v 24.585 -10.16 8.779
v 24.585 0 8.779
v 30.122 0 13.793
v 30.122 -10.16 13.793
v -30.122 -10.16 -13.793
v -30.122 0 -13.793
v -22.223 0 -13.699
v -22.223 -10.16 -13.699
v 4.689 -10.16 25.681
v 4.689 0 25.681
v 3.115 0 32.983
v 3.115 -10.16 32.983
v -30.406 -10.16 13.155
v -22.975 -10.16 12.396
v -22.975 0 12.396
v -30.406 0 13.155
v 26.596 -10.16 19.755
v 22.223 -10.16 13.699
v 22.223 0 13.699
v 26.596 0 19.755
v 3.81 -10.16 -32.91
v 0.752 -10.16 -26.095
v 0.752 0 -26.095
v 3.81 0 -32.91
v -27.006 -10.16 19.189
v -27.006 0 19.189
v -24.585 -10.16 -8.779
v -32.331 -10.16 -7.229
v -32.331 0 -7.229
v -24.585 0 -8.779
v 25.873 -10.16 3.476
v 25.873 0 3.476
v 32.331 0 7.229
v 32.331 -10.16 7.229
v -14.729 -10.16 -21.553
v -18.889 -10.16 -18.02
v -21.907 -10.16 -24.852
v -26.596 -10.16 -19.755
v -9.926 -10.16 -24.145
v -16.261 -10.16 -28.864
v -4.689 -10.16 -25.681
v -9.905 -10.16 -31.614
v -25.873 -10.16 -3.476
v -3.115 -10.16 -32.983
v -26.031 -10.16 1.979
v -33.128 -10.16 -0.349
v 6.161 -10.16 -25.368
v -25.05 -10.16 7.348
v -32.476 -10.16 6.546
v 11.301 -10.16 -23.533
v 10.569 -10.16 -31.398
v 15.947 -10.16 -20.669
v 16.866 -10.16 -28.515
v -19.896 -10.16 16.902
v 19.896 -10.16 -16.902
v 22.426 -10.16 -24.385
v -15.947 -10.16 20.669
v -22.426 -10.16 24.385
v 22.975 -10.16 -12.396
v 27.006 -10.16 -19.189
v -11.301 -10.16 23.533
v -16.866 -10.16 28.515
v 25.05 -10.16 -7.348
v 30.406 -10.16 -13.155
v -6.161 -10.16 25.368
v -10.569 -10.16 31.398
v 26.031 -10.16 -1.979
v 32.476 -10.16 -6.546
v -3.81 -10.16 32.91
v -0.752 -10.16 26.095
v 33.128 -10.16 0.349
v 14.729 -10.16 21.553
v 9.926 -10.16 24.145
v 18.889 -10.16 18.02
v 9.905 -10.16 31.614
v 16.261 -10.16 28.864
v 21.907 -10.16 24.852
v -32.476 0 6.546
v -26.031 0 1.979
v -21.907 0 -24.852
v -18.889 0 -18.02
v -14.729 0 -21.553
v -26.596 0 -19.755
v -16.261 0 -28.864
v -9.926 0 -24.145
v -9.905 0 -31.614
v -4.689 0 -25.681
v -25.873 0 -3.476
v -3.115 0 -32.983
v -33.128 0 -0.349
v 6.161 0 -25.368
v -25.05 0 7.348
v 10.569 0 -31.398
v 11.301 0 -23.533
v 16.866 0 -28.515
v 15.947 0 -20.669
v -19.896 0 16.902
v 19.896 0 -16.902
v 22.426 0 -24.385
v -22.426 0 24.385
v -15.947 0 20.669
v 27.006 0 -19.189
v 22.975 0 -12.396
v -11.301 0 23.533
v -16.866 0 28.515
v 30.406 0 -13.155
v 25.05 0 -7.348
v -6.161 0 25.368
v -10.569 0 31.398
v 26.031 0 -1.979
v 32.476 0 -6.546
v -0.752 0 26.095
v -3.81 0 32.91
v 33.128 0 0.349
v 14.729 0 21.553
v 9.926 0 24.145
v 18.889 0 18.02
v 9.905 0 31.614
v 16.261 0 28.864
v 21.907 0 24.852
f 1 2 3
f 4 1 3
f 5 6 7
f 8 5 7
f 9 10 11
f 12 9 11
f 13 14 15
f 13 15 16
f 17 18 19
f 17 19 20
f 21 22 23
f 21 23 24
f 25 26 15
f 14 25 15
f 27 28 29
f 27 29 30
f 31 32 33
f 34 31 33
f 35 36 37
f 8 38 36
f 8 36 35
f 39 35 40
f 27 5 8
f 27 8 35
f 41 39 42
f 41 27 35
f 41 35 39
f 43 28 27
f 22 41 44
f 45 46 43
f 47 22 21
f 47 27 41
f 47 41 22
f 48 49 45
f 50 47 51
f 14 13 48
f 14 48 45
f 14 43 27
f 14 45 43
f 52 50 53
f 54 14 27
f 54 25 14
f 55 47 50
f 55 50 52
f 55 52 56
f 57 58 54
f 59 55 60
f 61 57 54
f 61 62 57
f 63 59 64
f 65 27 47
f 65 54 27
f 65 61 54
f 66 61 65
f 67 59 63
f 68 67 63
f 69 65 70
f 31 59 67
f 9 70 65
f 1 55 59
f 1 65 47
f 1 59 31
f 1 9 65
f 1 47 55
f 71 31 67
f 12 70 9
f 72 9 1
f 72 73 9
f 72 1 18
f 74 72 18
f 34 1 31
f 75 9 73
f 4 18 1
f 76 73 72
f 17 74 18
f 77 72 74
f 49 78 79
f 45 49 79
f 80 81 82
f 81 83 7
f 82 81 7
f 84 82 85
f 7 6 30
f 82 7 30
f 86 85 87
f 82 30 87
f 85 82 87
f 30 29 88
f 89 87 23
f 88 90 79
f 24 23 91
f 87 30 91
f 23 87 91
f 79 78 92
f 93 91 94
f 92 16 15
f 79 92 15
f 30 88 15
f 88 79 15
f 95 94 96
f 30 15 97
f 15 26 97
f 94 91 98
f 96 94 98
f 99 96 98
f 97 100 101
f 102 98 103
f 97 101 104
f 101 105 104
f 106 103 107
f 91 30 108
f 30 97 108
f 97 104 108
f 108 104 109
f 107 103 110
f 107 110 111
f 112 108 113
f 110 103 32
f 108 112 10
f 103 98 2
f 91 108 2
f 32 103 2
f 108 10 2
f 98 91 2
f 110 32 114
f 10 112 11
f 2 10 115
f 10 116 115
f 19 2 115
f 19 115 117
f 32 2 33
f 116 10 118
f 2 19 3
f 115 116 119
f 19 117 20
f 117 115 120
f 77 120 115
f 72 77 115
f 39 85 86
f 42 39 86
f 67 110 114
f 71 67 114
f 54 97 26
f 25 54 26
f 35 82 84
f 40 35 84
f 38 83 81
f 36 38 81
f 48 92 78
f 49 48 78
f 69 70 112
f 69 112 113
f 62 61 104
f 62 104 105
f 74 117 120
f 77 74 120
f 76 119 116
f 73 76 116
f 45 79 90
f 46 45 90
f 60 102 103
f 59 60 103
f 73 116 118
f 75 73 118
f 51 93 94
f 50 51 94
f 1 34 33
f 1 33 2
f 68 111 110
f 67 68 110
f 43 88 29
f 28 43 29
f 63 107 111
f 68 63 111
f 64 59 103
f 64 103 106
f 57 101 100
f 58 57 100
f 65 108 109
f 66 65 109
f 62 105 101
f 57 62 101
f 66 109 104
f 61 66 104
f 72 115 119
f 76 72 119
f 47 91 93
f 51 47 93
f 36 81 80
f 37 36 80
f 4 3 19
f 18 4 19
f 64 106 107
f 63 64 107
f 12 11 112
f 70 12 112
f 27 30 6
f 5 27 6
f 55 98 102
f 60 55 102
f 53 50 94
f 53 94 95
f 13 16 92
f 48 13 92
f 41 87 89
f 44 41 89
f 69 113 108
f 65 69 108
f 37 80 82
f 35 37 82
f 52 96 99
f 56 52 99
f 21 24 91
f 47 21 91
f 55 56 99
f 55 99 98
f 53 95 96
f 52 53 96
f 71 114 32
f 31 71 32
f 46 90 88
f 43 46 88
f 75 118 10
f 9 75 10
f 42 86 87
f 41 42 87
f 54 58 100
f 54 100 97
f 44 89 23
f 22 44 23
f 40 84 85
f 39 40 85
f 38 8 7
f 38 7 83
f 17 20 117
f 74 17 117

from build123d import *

# Parameters (mm, degrees)
F1_DEPTH = 10.16
F2_R     = 25.4
F3_DEPTH = 10.16


with BuildPart() as f1:
    # F0 (on Front) → F1 (new body)
    with BuildSketch(Plane.XZ):
        with BuildLine():
            ThreePointArc((25.2112005568, 3.0911755833), (25.3527562026, 1.5484679297), (25.4, 0))
            ThreePointArc((25.4, 0), (25.3888981273, -0.750900713), (25.3556022141, -1.5011450163))
            Line((25.3556022141, -1.5011450163), (26.0305752657, -1.9793416351))
            Line((26.0305752657, -1.9793416351), (33.1276639033, 0.3492854048))
            Line((33.1276639033, 0.3492854048), (25.8732730079, 3.475972645))
            Line((25.8732730079, 3.475972645), (25.2112005568, 3.0911755833))
        make_face()
        with BuildLine():
            ThreePointArc((25.1136270694, 3.803384732), (25.164933526, 3.4476253613), (25.2112005568, 3.0911755833))
            Line((25.2112005568, 3.0911755833), (25.8732730079, 3.475972645))
            Line((25.8732730079, 3.475972645), (25.1136270694, 3.803384732))
        make_face()
        with BuildLine():
            Line((26.0305752657, -1.9793416351), (25.3556022141, -1.5011450163))
            ThreePointArc((25.3556022141, -1.5011450163), (25.3318209693, -1.8597974033), (25.3029668784, -2.218077355))
            Line((25.3029668784, -2.218077355), (26.0305752657, -1.9793416351))
        make_face()
        with BuildLine():
            ThreePointArc((24.0175837941, 8.2653293156), (24.6667024062, 6.0591907386), (25.1136270694, 3.803384732))
            Line((25.1136270694, 3.803384732), (25.8732730079, 3.475972645))
            Line((25.8732730079, 3.475972645), (32.3311244458, 7.2292812957))
            Line((32.3311244458, 7.2292812957), (24.5851845659, 8.779370241))
            Line((24.5851845659, 8.779370241), (24.0175837941, 8.2653293156))
        make_face()
        with BuildLine():
            Line((26.0305752657, -1.9793416351), (25.3029668784, -2.218077355))
            ThreePointArc((25.3029668784, -2.218077355), (24.9986488389, -4.4975055562), (24.4894158724, -6.740067524))
            Line((24.4894158724, -6.740067524), (25.0502164758, -7.3481491879))
            Line((25.0502164758, -7.3481491879), (32.476365484, -6.5459759343))
            Line((32.476365484, -6.5459759343), (26.0305752657, -1.9793416351))
        make_face()
        with BuildLine():
            ThreePointArc((23.7740659132, 8.9416883169), (23.8982177329, 8.6043703541), (24.0175837941, 8.2653293156))
            Line((24.0175837941, 8.2653293156), (24.5851845659, 8.779370241))
            Line((24.5851845659, 8.779370241), (23.7740659132, 8.9416883169))
        make_face()
        with BuildLine():
            Line((25.0502164758, -7.3481491879), (24.4894158724, -6.740067524))
            ThreePointArc((24.4894158724, -6.740067524), (24.3915862806, -7.0859380971), (24.2888721303, -7.4303896694))
            Line((24.2888721303, -7.4303896694), (25.0502164758, -7.3481491879))
        make_face()
        with BuildLine():
            ThreePointArc((21.7742833704, 13.0782484953), (22.8678991852, 11.0552786875), (23.7740659132, 8.9416883169))
            Line((23.7740659132, 8.9416883169), (24.5851845659, 8.779370241))
            Line((24.5851845659, 8.779370241), (30.1215597081, 13.793322904))
            Line((30.1215597081, 13.793322904), (22.2226055856, 13.6990672294))
            Line((22.2226055856, 13.6990672294), (21.7742833704, 13.0782484953))
        make_face()
        with BuildLine():
            Line((25.0502164758, -7.3481491879), (24.2888721303, -7.4303896694))
            ThreePointArc((24.2888721303, -7.4303896694), (23.5172843987, -9.5967356174), (22.5529245438, -11.6844167386))
            Line((22.5529245438, -11.6844167386), (22.9750430216, -12.3958073608))
            Line((22.9750430216, -12.3958073608), (30.4056940542, -13.155146714))
            Line((30.4056940542, -13.155146714), (25.0502164758, -7.3481491879))
        make_face()
        with BuildLine():
            ThreePointArc((21.3954639959, 13.6891972153), (21.5870351485, 13.3850630741), (21.7742833704, 13.0782484953))
            Line((21.7742833704, 13.0782484953), (22.2226055856, 13.6990672294))
            Line((22.2226055856, 13.6990672294), (21.3954639959, 13.6891972153))
        make_face()
        with BuildLine():
            Line((22.9750430216, -12.3958073608), (22.5529245438, -11.6844167386))
            ThreePointArc((22.5529245438, -11.6844167386), (22.3853222277, -12.002389294), (22.2132371191, -12.3179583003))
            Line((22.2132371191, -12.3179583003), (22.9750430216, -12.3958073608))
        make_face()
        with BuildLine():
            ThreePointArc((18.5793422789, 17.3195854594), (20.0696590374, 15.5681979086), (21.3954639959, 13.6891972153))
            Line((21.3954639959, 13.6891972153), (22.2226055856, 13.6990672294))
            Line((22.2226055856, 13.6990672294), (26.5955382719, 19.7545301137))
            Line((26.5955382719, 19.7545301137), (18.8887921054, 18.0200492444))
            Line((18.8887921054, 18.0200492444), (18.5793422789, 17.3195854594))
        make_face()
        with BuildLine():
            Line((22.9750430216, -12.3958073608), (22.2132371191, -12.3179583003))
            ThreePointArc((22.2132371191, -12.3179583003), (21.0081017818, -14.2765422818), (19.6307621917, -16.1181008736))
            Line((19.6307621917, -16.1181008736), (19.8957499409, -16.9017092703))
            Line((19.8957499409, -16.9017092703), (27.0061478915, -19.1893744569))
            Line((27.0061478915, -19.1893744569), (22.9750430216, -12.3958073608))
        make_face()
        with BuildLine():
            ThreePointArc((18.0817776352, 17.8384225073), (18.332395542, 17.580764309), (18.5793422789, 17.3195854594))
            Line((18.5793422789, 17.3195854594), (18.8887921054, 18.0200492444))
            Line((18.8887921054, 18.0200492444), (18.0817776352, 17.8384225073))
        make_face()
        with BuildLine():
            Line((19.8957499409, -16.9017092703), (19.6307621917, -16.1181008736))
            ThreePointArc((19.6307621917, -16.1181008736), (19.4007121767, -16.3942784848), (19.166777055, -16.6671730454))
            Line((19.166777055, -16.6671730454), (19.8957499409, -16.9017092703))
        make_face()
        with BuildLine():
            ThreePointArc((14.5723947762, 20.8039734303), (16.3942784848, 19.4007121767), (18.0817776352, 17.8384225073))
            Line((18.0817776352, 17.8384225073), (18.8887921054, 18.0200492444))
            Line((18.8887921054, 18.0200492444), (21.9071641936, 24.8523695646))
            Line((21.9071641936, 24.8523695646), (14.7294477716, 21.5534686376))
            Line((14.7294477716, 21.5534686376), (14.5723947762, 20.8039734303))
        make_face()
        with BuildLine():
            Line((19.8957499409, -16.9017092703), (19.166777055, -16.6671730454))
            ThreePointArc((19.166777055, -16.6671730454), (17.580764309, -18.332395542), (15.850641333, -19.8473466572))
            Line((15.850641333, -19.8473466572), (15.9469171174, -20.6689253814))
            Line((15.9469171174, -20.6689253814), (22.4263034761, -24.3849344552))
            Line((22.4263034761, -24.3849344552), (19.8957499409, -16.9017092703))
        make_face()
        with BuildLine():
            ThreePointArc((13.9778308259, 21.2080231375), (14.2765422818, 21.0081017818), (14.5723947762, 20.8039734303))
            Line((14.5723947762, 20.8039734303), (14.7294477716, 21.5534686376))
            Line((14.7294477716, 21.5534686376), (13.9778308259, 21.2080231375))
        make_face()
        with BuildLine():
            Line((15.9469171174, -20.6689253814), (15.850641333, -19.8473466572))
            ThreePointArc((15.850641333, -19.8473466572), (15.5681979086, -20.0696590374), (15.2826368611, -20.2879523504))
            Line((15.2826368611, -20.2879523504), (15.9469171174, -20.6689253814))
        make_face()
        with BuildLine():
            ThreePointArc((9.9285636957, 23.3791279337), (12.002389294, 22.3853222277), (13.9778308259, 21.2080231375))
            Line((13.9778308259, 21.2080231375), (14.7294477716, 21.5534686376))
            Line((14.7294477716, 21.5534686376), (16.2613419179, 28.8640412107))
            Line((16.2613419179, 28.8640412107), (9.9263558905, 24.1448980264))
            Line((9.9263558905, 24.1448980264), (9.9285636957, 23.3791279337))
        make_face()
        with BuildLine():
            Line((15.9469171174, -20.6689253814), (15.2826368611, -20.2879523504))
            ThreePointArc((15.2826368611, -20.2879523504), (13.3850630741, -21.5870351485), (11.3777713882, -22.7091681538))
            Line((11.3777713882, -22.7091681538), (11.3011274941, -23.5328102727))
            Line((11.3011274941, -23.5328102727), (16.8663219854, -28.5147558059))
            Line((16.8663219854, -28.5147558059), (15.9469171174, -20.6689253814))
        make_face()
        with BuildLine():
            ThreePointArc((9.2629857364, 23.6507313893), (9.5967356174, 23.5172843987), (9.9285636957, 23.3791279337))
            Line((9.9285636957, 23.3791279337), (9.9263558905, 24.1448980264))
            Line((9.9263558905, 24.1448980264), (9.2629857364, 23.6507313893))
        make_face()
        with BuildLine():
            Line((11.3011274941, -23.5328102727), (11.3777713882, -22.7091681538))
            ThreePointArc((11.3777713882, -22.7091681538), (11.0552786875, -22.8678991852), (10.7305721022, -23.0220507853))
            Line((10.7305721022, -23.0220507853), (11.3011274941, -23.5328102727))
        make_face()
        with BuildLine():
            ThreePointArc((4.8508067391, 24.932502361), (7.0859380971, 24.3915862806), (9.2629857364, 23.6507313893))
            Line((9.2629857364, 23.6507313893), (9.9263558905, 24.1448980264))
            Line((9.9263558905, 24.1448980264), (9.9048209697, 31.6142157509))
            Line((9.9048209697, 31.6142157509), (4.689434625, 25.6810795113))
            Line((4.689434625, 25.6810795113), (4.8508067391, 24.932502361))
        make_face()
        with BuildLine():
            Line((11.3011274941, -23.5328102727), (10.7305721022, -23.0220507853))
            ThreePointArc((10.7305721022, -23.0220507853), (8.6043703541, -23.8982177329), (6.4076382372, -24.5784900314))
            Line((6.4076382372, -24.5784900314), (6.1614243704, -25.3681984322))
            Line((6.1614243704, -25.3681984322), (10.5692012904, -31.3983454989))
            Line((10.5692012904, -31.3983454989), (11.3011274941, -23.5328102727))
        make_face()
        with BuildLine():
            ThreePointArc((4.1433037215, 25.0597891905), (4.4975055562, 24.9986488389), (4.8508067391, 24.932502361))
            Line((4.8508067391, 24.932502361), (4.689434625, 25.6810795113))
            Line((4.689434625, 25.6810795113), (4.1433037215, 25.0597891905))
        make_face()
        with BuildLine():
            Line((6.1614243704, -25.3681984322), (6.4076382372, -24.5784900314))
            ThreePointArc((6.4076382372, -24.5784900314), (6.0591907386, -24.6667024062), (5.7095298514, -24.7499751288))
            Line((5.7095298514, -24.7499751288), (6.1614243704, -25.3681984322))
        make_face()
        with BuildLine():
            ThreePointArc((-0.4389537487, 25.3962067956), (1.8597974033, 25.3318209693), (4.1433037215, 25.0597891905))
            Line((4.1433037215, 25.0597891905), (4.689434625, 25.6810795113))
            Line((4.689434625, 25.6810795113), (3.1154118166, 32.9826973608))
            Line((3.1154118166, 32.9826973608), (-0.752437436, 26.0948745901))
            Line((-0.752437436, 26.0948745901), (-0.4389537487, 25.3962067956))
        make_face()
        with BuildLine():
            Line((6.1614243704, -25.3681984322), (5.7095298514, -24.7499751288))
            ThreePointArc((5.7095298514, -24.7499751288), (3.4476253613, -25.164933526), (1.1574605479, -25.3736139539))
            Line((1.1574605479, -25.3736139539), (0.752437436, -26.0948745901))
            Line((0.752437436, -26.0948745901), (3.8101557823, -32.9096768276))
            Line((3.8101557823, -32.9096768276), (6.1614243704, -25.3681984322))
        make_face()
        with BuildLine():
            ThreePointArc((-1.1574605479, 25.3736139539), (-0.7982870791, 25.387452368), (-0.4389537487, 25.3962067956))
            Line((-0.4389537487, 25.3962067956), (-0.752437436, 26.0948745901))
            Line((-0.752437436, 26.0948745901), (-1.1574605479, 25.3736139539))
        make_face()
        with BuildLine():
            Line((0.752437436, -26.0948745901), (1.1574605479, -25.3736139539))
            ThreePointArc((1.1574605479, -25.3736139539), (0.7982870791, -25.387452368), (0.4389537487, -25.3962067956))
            Line((0.4389537487, -25.3962067956), (0.752437436, -26.0948745901))
        make_face()
        with BuildLine():
            ThreePointArc((-5.7095298514, 24.7499751288), (-3.4476253613, 25.164933526), (-1.1574605479, 25.3736139539))
            Line((-1.1574605479, 25.3736139539), (-0.752437436, 26.0948745901))
            Line((-0.752437436, 26.0948745901), (-3.8101557823, 32.9096768276))
            Line((-3.8101557823, 32.9096768276), (-6.1614243704, 25.3681984322))
            Line((-6.1614243704, 25.3681984322), (-5.7095298514, 24.7499751288))
        make_face()
        with BuildLine():
            Line((0.752437436, -26.0948745901), (0.4389537487, -25.3962067956))
            ThreePointArc((0.4389537487, -25.3962067956), (-1.8597974033, -25.3318209693), (-4.1433037215, -25.0597891905))
            Line((-4.1433037215, -25.0597891905), (-4.689434625, -25.6810795113))
            Line((-4.689434625, -25.6810795113), (-3.1154118166, -32.9826973608))
            Line((-3.1154118166, -32.9826973608), (0.752437436, -26.0948745901))
        make_face()
        with BuildLine():
            ThreePointArc((-6.4076382372, 24.5784900314), (-6.0591907386, 24.6667024062), (-5.7095298514, 24.7499751288))
            Line((-5.7095298514, 24.7499751288), (-6.1614243704, 25.3681984322))
            Line((-6.1614243704, 25.3681984322), (-6.4076382372, 24.5784900314))
        make_face()
        with BuildLine():
            Line((-4.689434625, -25.6810795113), (-4.1433037215, -25.0597891905))
            ThreePointArc((-4.1433037215, -25.0597891905), (-4.4975055562, -24.9986488389), (-4.8508067391, -24.932502361))
            Line((-4.8508067391, -24.932502361), (-4.689434625, -25.6810795113))
        make_face()
        with BuildLine():
            ThreePointArc((-10.7305721022, 23.0220507853), (-8.6043703541, 23.8982177329), (-6.4076382372, 24.5784900314))
            Line((-6.4076382372, 24.5784900314), (-6.1614243704, 25.3681984322))
            Line((-6.1614243704, 25.3681984322), (-10.5692012904, 31.3983454989))
            Line((-10.5692012904, 31.3983454989), (-11.3011274941, 23.5328102727))
            Line((-11.3011274941, 23.5328102727), (-10.7305721022, 23.0220507853))
        make_face()
        with BuildLine():
            Line((-4.689434625, -25.6810795113), (-4.8508067391, -24.932502361))
            ThreePointArc((-4.8508067391, -24.932502361), (-7.0859380971, -24.3915862806), (-9.2629857364, -23.6507313893))
            Line((-9.2629857364, -23.6507313893), (-9.9263558905, -24.1448980264))
            Line((-9.9263558905, -24.1448980264), (-9.9048209697, -31.6142157509))
            Line((-9.9048209697, -31.6142157509), (-4.689434625, -25.6810795113))
        make_face()
        with BuildLine():
            ThreePointArc((-11.3777713882, 22.7091681538), (-11.0552786875, 22.8678991852), (-10.7305721022, 23.0220507853))
            Line((-10.7305721022, 23.0220507853), (-11.3011274941, 23.5328102727))
            Line((-11.3011274941, 23.5328102727), (-11.3777713882, 22.7091681538))
        make_face()
        with BuildLine():
            Line((-9.9263558905, -24.1448980264), (-9.2629857364, -23.6507313893))
            ThreePointArc((-9.2629857364, -23.6507313893), (-9.5967356174, -23.5172843987), (-9.9285636957, -23.3791279337))
            Line((-9.9285636957, -23.3791279337), (-9.9263558905, -24.1448980264))
        make_face()
        with BuildLine():
            ThreePointArc((-15.2826368611, 20.2879523504), (-13.3850630741, 21.5870351485), (-11.3777713882, 22.7091681538))
            Line((-11.3777713882, 22.7091681538), (-11.3011274941, 23.5328102727))
            Line((-11.3011274941, 23.5328102727), (-16.8663219854, 28.5147558059))
            Line((-16.8663219854, 28.5147558059), (-15.9469171174, 20.6689253814))
            Line((-15.9469171174, 20.6689253814), (-15.2826368611, 20.2879523504))
        make_face()
        with BuildLine():
            Line((-9.9263558905, -24.1448980264), (-9.9285636957, -23.3791279337))
            ThreePointArc((-9.9285636957, -23.3791279337), (-12.002389294, -22.3853222277), (-13.9778308259, -21.2080231375))
            Line((-13.9778308259, -21.2080231375), (-14.7294477716, -21.5534686376))
            Line((-14.7294477716, -21.5534686376), (-16.2613419179, -28.8640412107))
            Line((-16.2613419179, -28.8640412107), (-9.9263558905, -24.1448980264))
        make_face()
        with BuildLine():
            ThreePointArc((-15.850641333, 19.8473466572), (-15.5681979086, 20.0696590374), (-15.2826368611, 20.2879523504))
            Line((-15.2826368611, 20.2879523504), (-15.9469171174, 20.6689253814))
            Line((-15.9469171174, 20.6689253814), (-15.850641333, 19.8473466572))
        make_face()
        with BuildLine():
            Line((-14.7294477716, -21.5534686376), (-13.9778308259, -21.2080231375))
            ThreePointArc((-13.9778308259, -21.2080231375), (-14.2765422818, -21.0081017818), (-14.5723947762, -20.8039734303))
            Line((-14.5723947762, -20.8039734303), (-14.7294477716, -21.5534686376))
        make_face()
        with BuildLine():
            ThreePointArc((-19.166777055, 16.6671730454), (-17.580764309, 18.332395542), (-15.850641333, 19.8473466572))
            Line((-15.850641333, 19.8473466572), (-15.9469171174, 20.6689253814))
            Line((-15.9469171174, 20.6689253814), (-22.4263034761, 24.3849344552))
            Line((-22.4263034761, 24.3849344552), (-19.8957499409, 16.9017092703))
            Line((-19.8957499409, 16.9017092703), (-19.166777055, 16.6671730454))
        make_face()
        with BuildLine():
            Line((-14.7294477716, -21.5534686376), (-14.5723947762, -20.8039734303))
            ThreePointArc((-14.5723947762, -20.8039734303), (-16.3942784848, -19.4007121767), (-18.0817776352, -17.8384225073))
            Line((-18.0817776352, -17.8384225073), (-18.8887921054, -18.0200492444))
            Line((-18.8887921054, -18.0200492444), (-21.9071641936, -24.8523695646))
            Line((-21.9071641936, -24.8523695646), (-14.7294477716, -21.5534686376))
        make_face()
        with BuildLine():
            ThreePointArc((-19.6307621917, 16.1181008736), (-19.4007121767, 16.3942784848), (-19.166777055, 16.6671730454))
            Line((-19.166777055, 16.6671730454), (-19.8957499409, 16.9017092703))
            Line((-19.8957499409, 16.9017092703), (-19.6307621917, 16.1181008736))
        make_face()
        with BuildLine():
            Line((-18.8887921054, -18.0200492444), (-18.0817776352, -17.8384225073))
            ThreePointArc((-18.0817776352, -17.8384225073), (-18.332395542, -17.580764309), (-18.5793422789, -17.3195854594))
            Line((-18.5793422789, -17.3195854594), (-18.8887921054, -18.0200492444))
        make_face()
        with BuildLine():
            ThreePointArc((-22.2132371191, 12.3179583003), (-21.0081017818, 14.2765422818), (-19.6307621917, 16.1181008736))
            Line((-19.6307621917, 16.1181008736), (-19.8957499409, 16.9017092703))
            Line((-19.8957499409, 16.9017092703), (-27.0061478915, 19.1893744569))
            Line((-27.0061478915, 19.1893744569), (-22.9750430216, 12.3958073608))
            Line((-22.9750430216, 12.3958073608), (-22.2132371191, 12.3179583003))
        make_face()
        with BuildLine():
            Line((-18.8887921054, -18.0200492444), (-18.5793422789, -17.3195854594))
            ThreePointArc((-18.5793422789, -17.3195854594), (-20.0696590374, -15.5681979086), (-21.3954639959, -13.6891972153))
            Line((-21.3954639959, -13.6891972153), (-22.2226055856, -13.6990672294))
            Line((-22.2226055856, -13.6990672294), (-26.5955382719, -19.7545301137))
            Line((-26.5955382719, -19.7545301137), (-18.8887921054, -18.0200492444))
        make_face()
        with BuildLine():
            ThreePointArc((-22.5529245438, 11.6844167386), (-22.3853222277, 12.002389294), (-22.2132371191, 12.3179583003))
            Line((-22.2132371191, 12.3179583003), (-22.9750430216, 12.3958073608))
            Line((-22.9750430216, 12.3958073608), (-22.5529245438, 11.6844167386))
        make_face()
        with BuildLine():
            Line((-22.2226055856, -13.6990672294), (-21.3954639959, -13.6891972153))
            ThreePointArc((-21.3954639959, -13.6891972153), (-21.5870351485, -13.3850630741), (-21.7742833704, -13.0782484953))
            Line((-21.7742833704, -13.0782484953), (-22.2226055856, -13.6990672294))
        make_face()
        with BuildLine():
            ThreePointArc((-24.2888721303, 7.4303896694), (-23.5172843987, 9.5967356174), (-22.5529245438, 11.6844167386))
            Line((-22.5529245438, 11.6844167386), (-22.9750430216, 12.3958073608))
            Line((-22.9750430216, 12.3958073608), (-30.4056940542, 13.155146714))
            Line((-30.4056940542, 13.155146714), (-25.0502164758, 7.3481491879))
            Line((-25.0502164758, 7.3481491879), (-24.2888721303, 7.4303896694))
        make_face()
        with BuildLine():
            Line((-22.2226055856, -13.6990672294), (-21.7742833704, -13.0782484953))
            ThreePointArc((-21.7742833704, -13.0782484953), (-22.8678991852, -11.0552786875), (-23.7740659132, -8.9416883169))
            Line((-23.7740659132, -8.9416883169), (-24.5851845659, -8.779370241))
            Line((-24.5851845659, -8.779370241), (-30.1215597081, -13.793322904))
            Line((-30.1215597081, -13.793322904), (-22.2226055856, -13.6990672294))
        make_face()
        with BuildLine():
            ThreePointArc((-24.4894158724, 6.740067524), (-24.3915862806, 7.0859380971), (-24.2888721303, 7.4303896694))
            Line((-24.2888721303, 7.4303896694), (-25.0502164758, 7.3481491879))
            Line((-25.0502164758, 7.3481491879), (-24.4894158724, 6.740067524))
        make_face()
        with BuildLine():
            Line((-24.5851845659, -8.779370241), (-23.7740659132, -8.9416883169))
            ThreePointArc((-23.7740659132, -8.9416883169), (-23.8982177329, -8.6043703541), (-24.0175837941, -8.2653293156))
            Line((-24.0175837941, -8.2653293156), (-24.5851845659, -8.779370241))
        make_face()
        with BuildLine():
            ThreePointArc((-25.3029668784, 2.218077355), (-24.9986488389, 4.4975055562), (-24.4894158724, 6.740067524))
            Line((-24.4894158724, 6.740067524), (-25.0502164758, 7.3481491879))
            Line((-25.0502164758, 7.3481491879), (-32.476365484, 6.5459759343))
            Line((-32.476365484, 6.5459759343), (-26.0305752657, 1.9793416351))
            Line((-26.0305752657, 1.9793416351), (-25.3029668784, 2.218077355))
        make_face()
        with BuildLine():
            Line((-24.5851845659, -8.779370241), (-24.0175837941, -8.2653293156))
            ThreePointArc((-24.0175837941, -8.2653293156), (-24.6667024062, -6.0591907386), (-25.1136270694, -3.803384732))
            Line((-25.1136270694, -3.803384732), (-25.8732730079, -3.475972645))
            Line((-25.8732730079, -3.475972645), (-32.3311244458, -7.2292812957))
            Line((-32.3311244458, -7.2292812957), (-24.5851845659, -8.779370241))
        make_face()
        with BuildLine():
            ThreePointArc((-25.3556022141, 1.5011450163), (-25.3318209693, 1.8597974033), (-25.3029668784, 2.218077355))
            Line((-25.3029668784, 2.218077355), (-26.0305752657, 1.9793416351))
            Line((-26.0305752657, 1.9793416351), (-25.3556022141, 1.5011450163))
        make_face()
        with BuildLine():
            Line((-25.8732730079, -3.475972645), (-25.1136270694, -3.803384732))
            ThreePointArc((-25.1136270694, -3.803384732), (-25.164933526, -3.4476253613), (-25.2112005568, -3.0911755833))
            Line((-25.2112005568, -3.0911755833), (-25.8732730079, -3.475972645))
        make_face()
        with BuildLine():
            ThreePointArc((-25.2112005568, -3.0911755833), (-25.387452368, -0.7982870791), (-25.3556022141, 1.5011450163))
            Line((-25.3556022141, 1.5011450163), (-26.0305752657, 1.9793416351))
            Line((-26.0305752657, 1.9793416351), (-33.1276639033, -0.3492854048))
            Line((-33.1276639033, -0.3492854048), (-25.8732730079, -3.475972645))
            Line((-25.8732730079, -3.475972645), (-25.2112005568, -3.0911755833))
        make_face()
    extrude(amount=F1_DEPTH)

    # F2 (on Front) → F3 (join)
    with BuildSketch(Plane.XZ):
        Circle(F2_R)
    extrude(amount=F3_DEPTH)


solid = f1.part
